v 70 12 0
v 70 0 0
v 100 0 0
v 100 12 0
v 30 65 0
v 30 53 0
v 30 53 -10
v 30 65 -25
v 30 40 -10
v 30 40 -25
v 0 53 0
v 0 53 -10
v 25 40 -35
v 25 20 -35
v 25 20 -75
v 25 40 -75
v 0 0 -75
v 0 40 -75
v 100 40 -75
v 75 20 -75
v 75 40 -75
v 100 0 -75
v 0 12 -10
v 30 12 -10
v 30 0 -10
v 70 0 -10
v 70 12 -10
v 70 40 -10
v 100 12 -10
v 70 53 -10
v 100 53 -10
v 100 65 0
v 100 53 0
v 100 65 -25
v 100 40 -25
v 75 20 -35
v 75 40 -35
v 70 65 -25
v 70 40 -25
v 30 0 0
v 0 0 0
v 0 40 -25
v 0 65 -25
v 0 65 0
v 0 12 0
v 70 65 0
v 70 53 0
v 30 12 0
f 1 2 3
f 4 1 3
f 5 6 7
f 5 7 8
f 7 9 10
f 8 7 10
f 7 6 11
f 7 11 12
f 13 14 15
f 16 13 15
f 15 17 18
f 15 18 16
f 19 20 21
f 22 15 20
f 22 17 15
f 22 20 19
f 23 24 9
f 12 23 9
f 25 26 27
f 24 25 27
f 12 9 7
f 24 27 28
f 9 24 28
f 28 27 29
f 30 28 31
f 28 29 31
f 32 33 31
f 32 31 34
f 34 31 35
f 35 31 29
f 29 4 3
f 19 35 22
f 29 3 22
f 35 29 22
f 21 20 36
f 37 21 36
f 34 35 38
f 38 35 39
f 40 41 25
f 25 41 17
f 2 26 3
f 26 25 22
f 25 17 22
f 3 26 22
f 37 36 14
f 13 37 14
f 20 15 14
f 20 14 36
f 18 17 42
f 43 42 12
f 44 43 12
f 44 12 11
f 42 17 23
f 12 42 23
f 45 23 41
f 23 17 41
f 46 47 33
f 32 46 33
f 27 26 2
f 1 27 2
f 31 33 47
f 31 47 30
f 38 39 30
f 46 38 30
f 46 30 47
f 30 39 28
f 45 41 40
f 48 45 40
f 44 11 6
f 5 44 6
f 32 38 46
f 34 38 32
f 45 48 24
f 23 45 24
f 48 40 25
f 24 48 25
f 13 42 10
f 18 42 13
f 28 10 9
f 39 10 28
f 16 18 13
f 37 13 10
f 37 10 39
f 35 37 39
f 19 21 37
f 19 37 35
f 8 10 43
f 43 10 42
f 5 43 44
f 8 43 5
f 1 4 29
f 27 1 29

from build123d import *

# Parameters (mm, degrees)
BOSS_EXTRUDE1_DEPTH = 40
SKETCH1_3_W         = 50
SKETCH1_3_H         = 40
BOSS_EXTRUDE2_DEPTH = 20
SKETCH1_4_W         = 30
SKETCH1_4_H         = 25
BOSS_EXTRUDE3_DEPTH = 65
SKETCH2_W           = 10
SKETCH2_H           = 41
CUT_EXTRUDE1_DEPTH  = 141.890028036


with BuildPart() as part:
    # Sketch1 → Boss-Extrude1 (new body)
    with BuildSketch(Plane(origin=(0, 0, 0), x_dir=(1, 0, 0), z_dir=(0, 1, 0))):
        Polygon((0, 75), (0, 25), (30, 25), (30, 10), (70, 10), (70, 25), (100, 25), (100, 75), (75, 75), (75, 35), (25, 35), (25, 75), align=None)
    extrude(amount=BOSS_EXTRUDE1_DEPTH)

    # Sketch1<3> → Boss-Extrude2 (add)
    with BuildSketch(Plane(origin=(0, 0, 0), x_dir=(1, 0, 0), z_dir=(0, 1, 0))):
        with Locations((50, 55)):
            Rectangle(SKETCH1_3_W, SKETCH1_3_H)
    extrude(amount=BOSS_EXTRUDE2_DEPTH)

    # Sketch1<4> → Boss-Extrude3 (add)
    with BuildSketch(Plane(origin=(0, 0, 0), x_dir=(1, 0, 0), z_dir=(0, 1, 0))):
        with Locations((15, 12.5)):
            Rectangle(SKETCH1_4_W, SKETCH1_4_H)
        with Locations((85, 12.5)):
            Rectangle(SKETCH1_4_W, SKETCH1_4_H)
    extrude(amount=BOSS_EXTRUDE3_DEPTH)

    # Sketch2 → Cut-Extrude1 (cut, through all)
    with BuildSketch(Plane(origin=(100, 0, 0), x_dir=(0, 0, -1), z_dir=(1, 0, 0))):
        with Locations((5, 32.5)):
            Rectangle(SKETCH2_W, SKETCH2_H)
    extrude(amount=-CUT_EXTRUDE1_DEPTH, mode=Mode.SUBTRACT)


solid = part.part
